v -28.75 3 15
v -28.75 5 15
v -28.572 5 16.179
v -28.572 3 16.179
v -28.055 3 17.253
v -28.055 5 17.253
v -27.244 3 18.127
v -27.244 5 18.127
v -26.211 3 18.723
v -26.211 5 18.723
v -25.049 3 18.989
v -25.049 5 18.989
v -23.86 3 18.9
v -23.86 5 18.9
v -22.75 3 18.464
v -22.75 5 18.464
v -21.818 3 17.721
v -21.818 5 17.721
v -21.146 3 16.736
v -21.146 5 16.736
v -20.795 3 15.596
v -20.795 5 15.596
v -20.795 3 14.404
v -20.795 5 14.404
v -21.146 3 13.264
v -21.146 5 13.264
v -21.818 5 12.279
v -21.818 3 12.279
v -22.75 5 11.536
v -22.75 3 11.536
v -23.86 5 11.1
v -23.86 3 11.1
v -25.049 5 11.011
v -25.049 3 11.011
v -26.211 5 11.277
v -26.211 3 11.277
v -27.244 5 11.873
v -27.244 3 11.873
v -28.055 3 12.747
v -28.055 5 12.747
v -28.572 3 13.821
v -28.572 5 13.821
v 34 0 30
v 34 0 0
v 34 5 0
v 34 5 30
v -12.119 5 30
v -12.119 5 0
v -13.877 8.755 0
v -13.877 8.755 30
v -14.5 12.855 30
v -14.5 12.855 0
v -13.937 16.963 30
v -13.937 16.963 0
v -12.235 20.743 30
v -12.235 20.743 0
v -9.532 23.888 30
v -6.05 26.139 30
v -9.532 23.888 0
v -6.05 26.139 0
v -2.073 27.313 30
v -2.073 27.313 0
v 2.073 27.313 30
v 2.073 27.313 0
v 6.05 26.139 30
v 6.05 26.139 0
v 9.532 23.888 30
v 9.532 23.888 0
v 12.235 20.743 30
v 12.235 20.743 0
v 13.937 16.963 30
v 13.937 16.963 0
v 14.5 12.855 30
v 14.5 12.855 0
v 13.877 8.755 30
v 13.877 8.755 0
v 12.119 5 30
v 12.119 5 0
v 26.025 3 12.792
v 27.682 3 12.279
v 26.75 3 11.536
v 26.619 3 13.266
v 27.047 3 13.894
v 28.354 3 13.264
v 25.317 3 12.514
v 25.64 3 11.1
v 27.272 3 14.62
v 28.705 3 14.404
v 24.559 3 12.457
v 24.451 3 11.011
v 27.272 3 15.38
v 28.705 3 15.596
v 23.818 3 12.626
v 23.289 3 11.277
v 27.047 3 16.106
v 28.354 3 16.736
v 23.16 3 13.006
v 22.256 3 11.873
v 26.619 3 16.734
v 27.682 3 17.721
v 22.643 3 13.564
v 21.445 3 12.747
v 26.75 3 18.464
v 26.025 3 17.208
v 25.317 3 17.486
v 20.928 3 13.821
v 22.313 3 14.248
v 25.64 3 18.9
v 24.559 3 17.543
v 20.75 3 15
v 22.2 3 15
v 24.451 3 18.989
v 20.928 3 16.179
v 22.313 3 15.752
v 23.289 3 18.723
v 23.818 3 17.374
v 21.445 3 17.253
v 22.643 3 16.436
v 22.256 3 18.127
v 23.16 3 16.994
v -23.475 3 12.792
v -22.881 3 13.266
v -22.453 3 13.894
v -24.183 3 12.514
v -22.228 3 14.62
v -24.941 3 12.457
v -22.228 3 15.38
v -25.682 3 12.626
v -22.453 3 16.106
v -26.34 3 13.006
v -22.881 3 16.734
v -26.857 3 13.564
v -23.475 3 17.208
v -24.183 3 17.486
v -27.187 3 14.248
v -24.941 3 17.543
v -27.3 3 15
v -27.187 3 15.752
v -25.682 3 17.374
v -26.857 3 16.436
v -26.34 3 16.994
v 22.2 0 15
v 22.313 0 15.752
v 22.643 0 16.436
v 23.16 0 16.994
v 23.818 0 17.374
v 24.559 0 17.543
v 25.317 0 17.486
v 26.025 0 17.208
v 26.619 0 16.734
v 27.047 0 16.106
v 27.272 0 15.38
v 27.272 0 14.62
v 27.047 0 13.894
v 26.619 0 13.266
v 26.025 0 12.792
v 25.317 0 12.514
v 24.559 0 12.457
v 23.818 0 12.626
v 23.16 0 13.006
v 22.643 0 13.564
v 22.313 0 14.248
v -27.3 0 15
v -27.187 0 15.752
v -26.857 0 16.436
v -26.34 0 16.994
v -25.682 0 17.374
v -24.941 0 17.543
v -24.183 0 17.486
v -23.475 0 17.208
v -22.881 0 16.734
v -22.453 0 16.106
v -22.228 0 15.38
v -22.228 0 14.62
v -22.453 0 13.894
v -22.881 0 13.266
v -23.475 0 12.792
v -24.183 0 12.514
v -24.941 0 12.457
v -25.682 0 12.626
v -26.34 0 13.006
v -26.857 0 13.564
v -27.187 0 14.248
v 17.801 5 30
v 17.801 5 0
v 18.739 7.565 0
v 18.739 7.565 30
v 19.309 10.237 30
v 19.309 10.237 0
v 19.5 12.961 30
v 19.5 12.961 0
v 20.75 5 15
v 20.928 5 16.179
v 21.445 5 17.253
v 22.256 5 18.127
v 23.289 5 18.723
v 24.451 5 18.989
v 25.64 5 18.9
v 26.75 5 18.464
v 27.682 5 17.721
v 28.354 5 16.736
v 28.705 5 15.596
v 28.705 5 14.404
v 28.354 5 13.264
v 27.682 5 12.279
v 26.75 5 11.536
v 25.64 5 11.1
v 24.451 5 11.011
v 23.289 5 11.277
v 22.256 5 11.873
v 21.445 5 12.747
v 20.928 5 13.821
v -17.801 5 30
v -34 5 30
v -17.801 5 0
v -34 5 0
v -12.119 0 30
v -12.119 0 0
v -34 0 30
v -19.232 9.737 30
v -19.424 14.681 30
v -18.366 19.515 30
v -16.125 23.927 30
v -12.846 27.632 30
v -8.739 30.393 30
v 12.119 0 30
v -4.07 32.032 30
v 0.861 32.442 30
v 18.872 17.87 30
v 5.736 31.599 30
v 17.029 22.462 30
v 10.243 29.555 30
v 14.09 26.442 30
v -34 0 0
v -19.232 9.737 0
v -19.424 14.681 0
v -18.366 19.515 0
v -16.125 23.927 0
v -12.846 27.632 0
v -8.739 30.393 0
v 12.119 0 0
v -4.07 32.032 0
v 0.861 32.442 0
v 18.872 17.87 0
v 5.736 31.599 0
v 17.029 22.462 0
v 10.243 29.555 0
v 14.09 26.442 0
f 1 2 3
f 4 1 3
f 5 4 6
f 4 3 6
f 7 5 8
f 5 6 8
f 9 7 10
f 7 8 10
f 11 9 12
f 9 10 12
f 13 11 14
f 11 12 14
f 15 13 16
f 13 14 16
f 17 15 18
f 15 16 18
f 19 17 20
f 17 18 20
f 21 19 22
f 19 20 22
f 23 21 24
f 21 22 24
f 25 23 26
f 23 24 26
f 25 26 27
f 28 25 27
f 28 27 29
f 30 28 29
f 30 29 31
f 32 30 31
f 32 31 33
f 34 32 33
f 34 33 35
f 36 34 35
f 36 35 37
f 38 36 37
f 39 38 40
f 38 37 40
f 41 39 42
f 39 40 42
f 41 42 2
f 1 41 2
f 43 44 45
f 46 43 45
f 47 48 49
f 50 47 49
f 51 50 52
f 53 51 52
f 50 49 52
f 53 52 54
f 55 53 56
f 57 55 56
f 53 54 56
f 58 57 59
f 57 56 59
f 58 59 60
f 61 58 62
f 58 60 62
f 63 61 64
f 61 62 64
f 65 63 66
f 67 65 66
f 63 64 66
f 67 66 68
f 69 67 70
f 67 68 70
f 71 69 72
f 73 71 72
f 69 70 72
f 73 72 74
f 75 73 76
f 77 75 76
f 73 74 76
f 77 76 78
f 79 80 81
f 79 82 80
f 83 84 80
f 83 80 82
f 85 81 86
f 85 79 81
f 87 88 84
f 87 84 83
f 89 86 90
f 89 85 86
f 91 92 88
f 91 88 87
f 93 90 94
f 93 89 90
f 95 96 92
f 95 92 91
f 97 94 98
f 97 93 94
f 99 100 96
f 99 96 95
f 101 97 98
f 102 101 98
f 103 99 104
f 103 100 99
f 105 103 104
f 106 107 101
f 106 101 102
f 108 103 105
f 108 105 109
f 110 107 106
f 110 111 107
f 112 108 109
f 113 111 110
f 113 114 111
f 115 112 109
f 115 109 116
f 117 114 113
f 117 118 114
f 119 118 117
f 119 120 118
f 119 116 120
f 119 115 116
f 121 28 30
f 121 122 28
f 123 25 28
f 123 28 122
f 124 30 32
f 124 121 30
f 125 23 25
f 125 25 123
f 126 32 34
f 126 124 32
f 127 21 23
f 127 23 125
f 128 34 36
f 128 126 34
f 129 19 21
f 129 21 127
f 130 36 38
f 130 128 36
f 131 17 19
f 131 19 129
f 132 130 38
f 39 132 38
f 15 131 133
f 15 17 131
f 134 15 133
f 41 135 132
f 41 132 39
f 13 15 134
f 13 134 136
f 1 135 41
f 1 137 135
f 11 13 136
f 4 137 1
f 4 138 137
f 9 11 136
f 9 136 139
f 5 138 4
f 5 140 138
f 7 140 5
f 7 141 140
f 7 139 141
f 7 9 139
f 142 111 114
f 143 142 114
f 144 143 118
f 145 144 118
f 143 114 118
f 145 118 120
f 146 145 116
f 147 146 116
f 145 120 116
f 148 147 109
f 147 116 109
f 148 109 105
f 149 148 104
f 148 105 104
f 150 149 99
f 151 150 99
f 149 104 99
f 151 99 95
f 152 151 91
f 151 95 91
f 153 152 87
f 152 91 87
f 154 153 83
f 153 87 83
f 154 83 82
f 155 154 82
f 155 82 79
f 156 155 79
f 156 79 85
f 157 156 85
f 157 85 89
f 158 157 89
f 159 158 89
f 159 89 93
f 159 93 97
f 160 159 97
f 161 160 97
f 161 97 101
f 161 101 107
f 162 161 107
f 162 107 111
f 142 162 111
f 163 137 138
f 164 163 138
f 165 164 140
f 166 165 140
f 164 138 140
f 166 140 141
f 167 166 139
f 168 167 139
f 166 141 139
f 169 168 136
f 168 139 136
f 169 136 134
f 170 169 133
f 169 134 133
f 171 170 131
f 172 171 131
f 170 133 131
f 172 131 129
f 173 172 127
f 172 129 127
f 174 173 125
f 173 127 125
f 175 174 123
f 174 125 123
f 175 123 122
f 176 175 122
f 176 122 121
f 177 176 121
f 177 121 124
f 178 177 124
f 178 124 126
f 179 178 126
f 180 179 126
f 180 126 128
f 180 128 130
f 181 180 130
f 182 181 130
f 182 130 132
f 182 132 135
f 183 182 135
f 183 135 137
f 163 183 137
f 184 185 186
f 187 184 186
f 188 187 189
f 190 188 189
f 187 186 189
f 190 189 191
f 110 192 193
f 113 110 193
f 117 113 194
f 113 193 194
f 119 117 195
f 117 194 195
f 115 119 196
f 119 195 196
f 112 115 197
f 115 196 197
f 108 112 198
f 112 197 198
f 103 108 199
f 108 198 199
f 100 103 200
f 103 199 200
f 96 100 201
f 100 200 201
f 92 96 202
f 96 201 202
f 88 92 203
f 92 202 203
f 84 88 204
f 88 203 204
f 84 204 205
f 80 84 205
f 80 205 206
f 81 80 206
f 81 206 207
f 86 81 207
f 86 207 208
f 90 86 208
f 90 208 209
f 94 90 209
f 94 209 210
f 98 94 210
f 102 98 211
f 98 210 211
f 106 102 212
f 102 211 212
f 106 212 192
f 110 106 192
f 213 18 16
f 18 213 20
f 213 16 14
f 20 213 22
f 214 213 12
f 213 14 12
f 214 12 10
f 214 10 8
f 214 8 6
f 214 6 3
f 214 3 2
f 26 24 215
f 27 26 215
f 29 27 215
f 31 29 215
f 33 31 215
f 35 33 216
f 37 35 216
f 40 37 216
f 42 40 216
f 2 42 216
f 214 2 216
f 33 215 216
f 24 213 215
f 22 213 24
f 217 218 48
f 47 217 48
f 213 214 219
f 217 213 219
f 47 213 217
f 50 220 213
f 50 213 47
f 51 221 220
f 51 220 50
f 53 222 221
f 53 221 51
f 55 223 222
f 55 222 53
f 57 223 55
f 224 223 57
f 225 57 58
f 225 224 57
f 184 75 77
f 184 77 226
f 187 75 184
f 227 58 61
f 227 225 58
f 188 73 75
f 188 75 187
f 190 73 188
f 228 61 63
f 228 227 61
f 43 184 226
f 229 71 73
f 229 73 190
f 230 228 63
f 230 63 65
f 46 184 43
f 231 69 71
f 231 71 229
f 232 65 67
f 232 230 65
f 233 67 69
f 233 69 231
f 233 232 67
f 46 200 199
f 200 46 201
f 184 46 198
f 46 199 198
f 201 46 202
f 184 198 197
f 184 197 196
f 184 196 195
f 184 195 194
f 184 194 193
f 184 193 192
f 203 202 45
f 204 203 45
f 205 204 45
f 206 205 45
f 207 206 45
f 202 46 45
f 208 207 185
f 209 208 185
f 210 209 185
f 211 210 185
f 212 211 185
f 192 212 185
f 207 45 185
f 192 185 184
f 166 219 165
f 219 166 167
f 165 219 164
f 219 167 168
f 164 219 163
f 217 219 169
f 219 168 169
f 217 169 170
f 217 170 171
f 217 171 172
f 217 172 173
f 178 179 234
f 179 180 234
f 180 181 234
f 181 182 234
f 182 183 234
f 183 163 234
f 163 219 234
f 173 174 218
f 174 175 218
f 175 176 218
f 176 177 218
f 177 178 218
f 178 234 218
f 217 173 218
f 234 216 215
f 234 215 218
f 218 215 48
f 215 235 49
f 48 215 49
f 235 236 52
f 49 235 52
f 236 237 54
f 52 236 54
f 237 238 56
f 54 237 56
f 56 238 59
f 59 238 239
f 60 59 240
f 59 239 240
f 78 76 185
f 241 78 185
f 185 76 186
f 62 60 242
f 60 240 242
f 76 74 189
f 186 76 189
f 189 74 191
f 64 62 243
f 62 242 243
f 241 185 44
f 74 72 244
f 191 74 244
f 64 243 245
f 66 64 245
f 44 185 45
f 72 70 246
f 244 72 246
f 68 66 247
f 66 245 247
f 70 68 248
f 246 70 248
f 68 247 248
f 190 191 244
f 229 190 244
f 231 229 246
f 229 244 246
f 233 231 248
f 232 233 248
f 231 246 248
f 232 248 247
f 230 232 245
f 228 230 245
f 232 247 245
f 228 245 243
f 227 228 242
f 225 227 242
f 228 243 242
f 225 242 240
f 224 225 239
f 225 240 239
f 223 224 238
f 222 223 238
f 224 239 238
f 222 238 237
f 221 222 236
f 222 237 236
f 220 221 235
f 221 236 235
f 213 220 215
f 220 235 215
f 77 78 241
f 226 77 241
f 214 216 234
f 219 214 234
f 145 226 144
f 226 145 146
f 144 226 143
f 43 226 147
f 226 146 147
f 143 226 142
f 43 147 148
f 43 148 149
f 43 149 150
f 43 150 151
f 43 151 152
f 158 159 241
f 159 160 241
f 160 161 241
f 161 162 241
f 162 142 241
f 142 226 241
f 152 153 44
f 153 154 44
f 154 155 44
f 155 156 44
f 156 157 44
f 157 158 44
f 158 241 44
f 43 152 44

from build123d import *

# Parameters (mm, degrees)
F1_DEPTH = 30
F2_R     = 2.55
F3_DEPTH = 6
F2_R_2   = 4
F4_DEPTH = 2


with BuildPart() as f1:
    # F0 (on Top) → F1 (new body)
    with BuildSketch(Plane.XY):
        with BuildLine():
            Line((-34, 5), (-34, 0))
            Line((-34, 0), (-14.5688022843, 0))
            ThreePointArc((-14.5688022843, 0), (-16.37669445, 2.3759309202), (-17.8006970079, 5))
            Line((-17.8006970079, 5), (-34, 5))
        make_face()
        with BuildLine():
            ThreePointArc((-17.8006970079, 5), (-16.37669445, 2.3759309202), (-14.5688022843, 0))
            Line((-14.5688022843, 0), (-12.1187793927, 0))
            Line((-12.1187793927, 0), (-12.1187793927, 5))
            Line((-12.1187793927, 5), (-17.8006970079, 5))
        make_face()
        with BuildLine():
            ThreePointArc((19.5, 12.9614813968), (-4.0704058978, 32.0319243866), (-17.8006970079, 5))
            Line((-17.8006970079, 5), (-12.1187793927, 5))
            ThreePointArc((-12.1187793927, 5), (-4.1549788692, 26.8534269264), (14.5, 12.9614813968))
            ThreePointArc((14.5, 12.9614813968), (13.8919455296, 8.8065025277), (12.1187793927, 5))
            Line((12.1187793927, 5), (17.8006970079, 5))
            ThreePointArc((17.8006970079, 5), (19.0704429898, 8.891075499), (19.5, 12.9614813968))
        make_face()
        with BuildLine():
            Line((12.1187793927, 0), (14.5688022843, 0))
            ThreePointArc((14.5688022843, 0), (16.37669445, 2.3759309202), (17.8006970079, 5))
            Line((17.8006970079, 5), (12.1187793927, 5))
            Line((12.1187793927, 5), (12.1187793927, 0))
        make_face()
        with BuildLine():
            ThreePointArc((17.8006970079, 5), (16.37669445, 2.3759309202), (14.5688022843, 0))
            Line((14.5688022843, 0), (34, 0))
            Line((34, 0), (34, 5))
            Line((34, 5), (17.8006970079, 5))
        make_face()
    extrude(amount=F1_DEPTH)

    # F2 (on face) → F3 (cut)
    with BuildSketch(Plane(origin=(0, 5, 0), x_dir=(-1, 0, 0), z_dir=(0, 1, 0))):
        with Locations((-24.75, 15)):
            Circle(F2_R)
        with Locations((24.75, 15)):
            Circle(F2_R)
    extrude(amount=-F3_DEPTH, mode=Mode.SUBTRACT)

    # F2 (on face) → F4 (cut)
    with BuildSketch(Plane(origin=(0, 5, 0), x_dir=(-1, 0, 0), z_dir=(0, 1, 0))):
        with Locations((24.75, 15)):
            Circle(F2_R_2)
        with Locations((24.75, 15)):
            Circle(F2_R, mode=Mode.SUBTRACT)
        with Locations((-24.75, 15)):
            Circle(F2_R_2)
        with Locations((-24.75, 15)):
            Circle(F2_R, mode=Mode.SUBTRACT)
    extrude(amount=-F4_DEPTH, mode=Mode.SUBTRACT)


solid = f1.part
